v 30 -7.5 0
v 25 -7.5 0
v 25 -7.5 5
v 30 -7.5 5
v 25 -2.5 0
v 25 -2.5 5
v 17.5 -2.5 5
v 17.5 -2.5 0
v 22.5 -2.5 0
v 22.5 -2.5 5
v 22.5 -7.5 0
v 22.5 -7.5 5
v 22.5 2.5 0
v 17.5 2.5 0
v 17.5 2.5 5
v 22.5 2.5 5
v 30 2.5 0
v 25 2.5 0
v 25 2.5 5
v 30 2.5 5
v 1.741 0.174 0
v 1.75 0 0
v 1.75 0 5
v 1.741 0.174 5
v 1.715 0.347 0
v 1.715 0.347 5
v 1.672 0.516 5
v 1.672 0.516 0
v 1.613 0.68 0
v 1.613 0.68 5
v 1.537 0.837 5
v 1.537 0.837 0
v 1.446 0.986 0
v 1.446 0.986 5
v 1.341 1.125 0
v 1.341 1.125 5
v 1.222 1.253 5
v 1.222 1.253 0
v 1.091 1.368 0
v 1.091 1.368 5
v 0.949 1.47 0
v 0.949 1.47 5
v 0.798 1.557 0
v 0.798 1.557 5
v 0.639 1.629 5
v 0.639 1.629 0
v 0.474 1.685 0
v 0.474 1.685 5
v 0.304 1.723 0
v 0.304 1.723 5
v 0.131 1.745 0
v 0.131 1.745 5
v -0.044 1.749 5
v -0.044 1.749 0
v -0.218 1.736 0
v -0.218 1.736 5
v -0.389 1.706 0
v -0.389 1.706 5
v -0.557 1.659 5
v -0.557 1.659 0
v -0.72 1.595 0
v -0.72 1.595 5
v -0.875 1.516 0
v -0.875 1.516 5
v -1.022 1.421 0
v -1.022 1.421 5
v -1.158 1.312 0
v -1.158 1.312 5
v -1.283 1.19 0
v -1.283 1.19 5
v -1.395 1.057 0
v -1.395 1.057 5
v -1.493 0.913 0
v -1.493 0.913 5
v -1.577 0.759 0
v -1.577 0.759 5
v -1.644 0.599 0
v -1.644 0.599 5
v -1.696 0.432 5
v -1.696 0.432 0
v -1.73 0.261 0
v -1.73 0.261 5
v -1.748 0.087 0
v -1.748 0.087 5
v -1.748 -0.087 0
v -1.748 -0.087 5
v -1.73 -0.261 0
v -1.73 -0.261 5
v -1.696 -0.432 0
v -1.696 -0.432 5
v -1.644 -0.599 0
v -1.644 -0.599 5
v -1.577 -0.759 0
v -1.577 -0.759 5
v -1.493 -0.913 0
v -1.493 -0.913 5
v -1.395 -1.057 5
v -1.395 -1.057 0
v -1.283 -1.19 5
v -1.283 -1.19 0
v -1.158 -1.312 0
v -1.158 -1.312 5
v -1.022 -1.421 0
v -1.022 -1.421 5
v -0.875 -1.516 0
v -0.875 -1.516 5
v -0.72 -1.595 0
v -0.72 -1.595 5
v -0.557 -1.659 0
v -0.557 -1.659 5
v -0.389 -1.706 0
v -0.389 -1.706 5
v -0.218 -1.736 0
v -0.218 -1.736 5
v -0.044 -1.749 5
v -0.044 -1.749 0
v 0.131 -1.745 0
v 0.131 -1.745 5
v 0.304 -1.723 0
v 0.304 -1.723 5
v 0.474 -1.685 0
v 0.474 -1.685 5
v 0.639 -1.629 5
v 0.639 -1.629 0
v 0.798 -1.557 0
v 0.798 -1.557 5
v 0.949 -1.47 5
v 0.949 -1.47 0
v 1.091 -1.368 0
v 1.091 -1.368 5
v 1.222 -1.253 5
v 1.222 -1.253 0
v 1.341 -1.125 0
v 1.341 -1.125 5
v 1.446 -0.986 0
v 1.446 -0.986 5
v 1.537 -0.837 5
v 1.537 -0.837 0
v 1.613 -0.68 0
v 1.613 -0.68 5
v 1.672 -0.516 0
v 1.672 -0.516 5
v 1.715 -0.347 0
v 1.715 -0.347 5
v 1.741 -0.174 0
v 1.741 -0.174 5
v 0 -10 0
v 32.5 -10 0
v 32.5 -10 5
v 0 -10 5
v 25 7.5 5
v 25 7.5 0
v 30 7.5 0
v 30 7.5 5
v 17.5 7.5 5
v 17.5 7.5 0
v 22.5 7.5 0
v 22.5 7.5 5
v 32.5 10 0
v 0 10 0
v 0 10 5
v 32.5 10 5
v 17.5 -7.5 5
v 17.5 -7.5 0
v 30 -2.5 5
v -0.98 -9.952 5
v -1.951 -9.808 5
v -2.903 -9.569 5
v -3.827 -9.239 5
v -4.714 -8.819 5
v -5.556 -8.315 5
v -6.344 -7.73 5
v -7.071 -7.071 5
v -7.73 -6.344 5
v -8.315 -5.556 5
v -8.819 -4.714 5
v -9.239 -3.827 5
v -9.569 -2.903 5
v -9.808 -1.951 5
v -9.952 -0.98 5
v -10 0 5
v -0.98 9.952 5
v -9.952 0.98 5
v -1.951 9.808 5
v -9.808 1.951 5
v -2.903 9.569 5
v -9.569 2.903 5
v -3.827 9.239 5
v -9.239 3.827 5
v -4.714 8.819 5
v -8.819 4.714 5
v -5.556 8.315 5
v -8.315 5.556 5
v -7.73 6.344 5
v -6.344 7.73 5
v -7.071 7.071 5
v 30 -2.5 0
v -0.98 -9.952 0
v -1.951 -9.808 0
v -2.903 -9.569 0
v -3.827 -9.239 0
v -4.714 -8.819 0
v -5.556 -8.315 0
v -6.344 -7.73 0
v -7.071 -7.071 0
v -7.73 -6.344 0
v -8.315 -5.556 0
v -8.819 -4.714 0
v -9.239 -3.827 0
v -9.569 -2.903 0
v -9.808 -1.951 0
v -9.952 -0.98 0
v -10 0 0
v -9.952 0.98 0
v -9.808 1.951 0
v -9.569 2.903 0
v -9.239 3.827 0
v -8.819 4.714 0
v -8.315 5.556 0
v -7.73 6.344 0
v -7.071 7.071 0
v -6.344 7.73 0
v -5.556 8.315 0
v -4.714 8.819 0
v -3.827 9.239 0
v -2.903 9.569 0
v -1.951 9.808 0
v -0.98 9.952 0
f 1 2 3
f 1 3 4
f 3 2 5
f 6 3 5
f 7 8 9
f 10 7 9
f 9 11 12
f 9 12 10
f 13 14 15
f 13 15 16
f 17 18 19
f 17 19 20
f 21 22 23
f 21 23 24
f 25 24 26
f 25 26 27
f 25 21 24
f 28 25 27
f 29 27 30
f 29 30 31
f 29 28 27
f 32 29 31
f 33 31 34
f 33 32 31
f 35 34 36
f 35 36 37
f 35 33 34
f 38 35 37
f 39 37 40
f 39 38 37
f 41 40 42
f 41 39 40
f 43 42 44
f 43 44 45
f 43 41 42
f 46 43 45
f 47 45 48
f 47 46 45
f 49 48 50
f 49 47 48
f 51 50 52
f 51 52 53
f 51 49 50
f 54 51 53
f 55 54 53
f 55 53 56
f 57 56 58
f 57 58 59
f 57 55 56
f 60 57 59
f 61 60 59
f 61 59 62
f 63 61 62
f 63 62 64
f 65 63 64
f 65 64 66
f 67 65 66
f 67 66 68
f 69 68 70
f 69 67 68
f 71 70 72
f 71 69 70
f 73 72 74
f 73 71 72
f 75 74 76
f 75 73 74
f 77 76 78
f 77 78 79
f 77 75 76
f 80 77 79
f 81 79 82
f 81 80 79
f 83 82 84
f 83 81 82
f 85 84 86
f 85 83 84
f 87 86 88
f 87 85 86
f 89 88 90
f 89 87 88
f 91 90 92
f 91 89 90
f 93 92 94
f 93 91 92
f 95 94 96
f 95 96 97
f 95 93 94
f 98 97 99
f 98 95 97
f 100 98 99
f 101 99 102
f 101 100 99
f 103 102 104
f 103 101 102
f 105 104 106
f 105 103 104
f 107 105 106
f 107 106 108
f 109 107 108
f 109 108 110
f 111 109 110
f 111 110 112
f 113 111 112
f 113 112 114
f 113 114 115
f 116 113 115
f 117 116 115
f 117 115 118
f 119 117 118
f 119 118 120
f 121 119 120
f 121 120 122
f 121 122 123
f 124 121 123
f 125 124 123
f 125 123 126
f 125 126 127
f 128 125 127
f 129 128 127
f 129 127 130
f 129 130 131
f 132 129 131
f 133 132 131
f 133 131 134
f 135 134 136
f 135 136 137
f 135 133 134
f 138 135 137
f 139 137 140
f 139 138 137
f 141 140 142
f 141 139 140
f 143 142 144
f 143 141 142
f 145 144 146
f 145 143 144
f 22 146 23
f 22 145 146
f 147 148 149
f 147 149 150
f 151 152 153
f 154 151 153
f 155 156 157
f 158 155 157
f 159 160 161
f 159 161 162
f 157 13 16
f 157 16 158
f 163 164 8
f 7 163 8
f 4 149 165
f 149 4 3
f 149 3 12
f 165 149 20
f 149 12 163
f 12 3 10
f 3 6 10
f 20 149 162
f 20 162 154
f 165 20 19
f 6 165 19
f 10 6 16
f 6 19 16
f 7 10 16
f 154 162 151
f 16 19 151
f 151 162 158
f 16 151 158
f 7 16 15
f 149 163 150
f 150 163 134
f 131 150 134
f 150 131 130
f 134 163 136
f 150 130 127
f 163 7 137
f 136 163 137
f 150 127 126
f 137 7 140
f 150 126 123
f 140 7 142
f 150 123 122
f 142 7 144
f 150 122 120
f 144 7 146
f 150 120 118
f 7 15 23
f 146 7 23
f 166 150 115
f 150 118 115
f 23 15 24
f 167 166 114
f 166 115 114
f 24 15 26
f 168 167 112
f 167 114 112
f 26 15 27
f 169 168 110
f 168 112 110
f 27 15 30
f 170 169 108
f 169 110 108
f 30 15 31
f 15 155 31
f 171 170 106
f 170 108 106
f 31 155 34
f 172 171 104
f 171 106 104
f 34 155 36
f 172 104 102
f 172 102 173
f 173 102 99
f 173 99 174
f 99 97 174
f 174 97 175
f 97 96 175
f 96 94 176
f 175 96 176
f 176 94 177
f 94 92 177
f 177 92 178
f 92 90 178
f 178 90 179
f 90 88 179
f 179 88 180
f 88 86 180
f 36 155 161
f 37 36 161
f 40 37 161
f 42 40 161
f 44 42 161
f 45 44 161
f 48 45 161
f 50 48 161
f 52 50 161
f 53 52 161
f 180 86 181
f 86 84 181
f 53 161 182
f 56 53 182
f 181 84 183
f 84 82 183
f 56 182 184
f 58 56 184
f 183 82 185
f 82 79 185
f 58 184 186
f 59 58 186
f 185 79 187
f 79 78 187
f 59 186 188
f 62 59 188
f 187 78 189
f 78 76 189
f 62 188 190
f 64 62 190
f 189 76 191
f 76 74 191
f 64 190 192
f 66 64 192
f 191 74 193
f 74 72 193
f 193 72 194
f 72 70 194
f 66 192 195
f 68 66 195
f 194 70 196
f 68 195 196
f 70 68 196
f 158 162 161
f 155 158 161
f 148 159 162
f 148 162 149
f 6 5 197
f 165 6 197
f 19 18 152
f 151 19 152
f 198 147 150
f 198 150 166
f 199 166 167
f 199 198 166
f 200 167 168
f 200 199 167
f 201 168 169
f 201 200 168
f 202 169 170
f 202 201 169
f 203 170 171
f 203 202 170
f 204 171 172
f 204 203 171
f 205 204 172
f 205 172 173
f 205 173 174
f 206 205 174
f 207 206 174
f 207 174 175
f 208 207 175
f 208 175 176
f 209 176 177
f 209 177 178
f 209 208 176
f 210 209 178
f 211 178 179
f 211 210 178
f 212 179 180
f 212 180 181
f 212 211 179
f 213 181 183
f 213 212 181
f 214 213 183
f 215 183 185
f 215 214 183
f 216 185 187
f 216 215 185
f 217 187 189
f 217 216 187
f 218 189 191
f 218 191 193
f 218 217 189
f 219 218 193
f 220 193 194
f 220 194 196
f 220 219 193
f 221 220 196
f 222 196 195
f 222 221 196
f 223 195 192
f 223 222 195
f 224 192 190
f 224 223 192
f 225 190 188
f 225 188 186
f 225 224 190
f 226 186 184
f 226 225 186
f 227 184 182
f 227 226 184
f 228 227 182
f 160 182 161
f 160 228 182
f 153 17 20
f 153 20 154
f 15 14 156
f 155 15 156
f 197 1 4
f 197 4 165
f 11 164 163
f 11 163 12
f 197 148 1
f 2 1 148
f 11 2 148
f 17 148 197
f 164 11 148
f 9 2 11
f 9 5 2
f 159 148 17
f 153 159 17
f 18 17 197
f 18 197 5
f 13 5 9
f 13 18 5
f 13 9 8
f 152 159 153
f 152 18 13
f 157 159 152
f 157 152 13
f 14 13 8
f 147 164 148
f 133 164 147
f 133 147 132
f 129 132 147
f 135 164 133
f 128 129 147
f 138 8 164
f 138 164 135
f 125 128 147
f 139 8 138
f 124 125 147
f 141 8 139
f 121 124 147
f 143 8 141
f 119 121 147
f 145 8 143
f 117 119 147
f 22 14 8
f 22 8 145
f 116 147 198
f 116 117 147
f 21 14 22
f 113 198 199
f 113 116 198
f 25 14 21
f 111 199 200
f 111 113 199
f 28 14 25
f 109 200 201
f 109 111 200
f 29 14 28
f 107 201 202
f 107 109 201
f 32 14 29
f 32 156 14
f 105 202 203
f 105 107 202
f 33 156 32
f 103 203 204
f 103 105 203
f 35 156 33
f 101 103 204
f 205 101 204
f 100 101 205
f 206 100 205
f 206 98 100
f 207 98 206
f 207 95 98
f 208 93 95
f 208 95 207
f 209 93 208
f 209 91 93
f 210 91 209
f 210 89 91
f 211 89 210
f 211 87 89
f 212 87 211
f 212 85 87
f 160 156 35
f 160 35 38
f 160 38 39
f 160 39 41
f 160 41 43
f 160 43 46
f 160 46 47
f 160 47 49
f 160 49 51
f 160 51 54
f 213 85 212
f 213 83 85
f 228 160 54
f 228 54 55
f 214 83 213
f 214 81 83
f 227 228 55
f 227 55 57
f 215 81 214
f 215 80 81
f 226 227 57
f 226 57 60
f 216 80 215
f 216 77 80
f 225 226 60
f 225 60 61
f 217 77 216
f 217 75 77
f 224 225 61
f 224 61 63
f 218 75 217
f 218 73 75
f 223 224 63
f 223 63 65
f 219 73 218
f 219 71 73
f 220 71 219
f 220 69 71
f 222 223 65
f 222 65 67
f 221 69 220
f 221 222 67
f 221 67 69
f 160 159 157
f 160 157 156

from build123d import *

# Parameters (mm, degrees)
SKETCH1_R           = 1.75
SKETCH1_W           = 5
SKETCH1_H           = 5
BOSS_EXTRUDE1_DEPTH = 5


with BuildPart() as part:
    # Sketch1 → Boss-Extrude1 (new body)
    with BuildSketch(Plane.XY):
        with BuildLine():
            Line((0, 10), (32.5, 10))
            Line((32.5, 10), (32.5, -10))
            Line((32.5, -10), (0, -10))
            ThreePointArc((0, -10), (-10, 0), (0, 10))
        make_face()
        Circle(SKETCH1_R, mode=Mode.SUBTRACT)
        with Locations((27.5, 5)):
            Rectangle(SKETCH1_W, SKETCH1_H, mode=Mode.SUBTRACT)
        with Locations((27.5, -5)):
            Rectangle(SKETCH1_W, SKETCH1_H, mode=Mode.SUBTRACT)
        with Locations((20, -5)):
            Rectangle(SKETCH1_W, SKETCH1_H, mode=Mode.SUBTRACT)
        with Locations((20, 5)):
            Rectangle(SKETCH1_W, SKETCH1_H, mode=Mode.SUBTRACT)
    extrude(amount=BOSS_EXTRUDE1_DEPTH)


solid = part.part
